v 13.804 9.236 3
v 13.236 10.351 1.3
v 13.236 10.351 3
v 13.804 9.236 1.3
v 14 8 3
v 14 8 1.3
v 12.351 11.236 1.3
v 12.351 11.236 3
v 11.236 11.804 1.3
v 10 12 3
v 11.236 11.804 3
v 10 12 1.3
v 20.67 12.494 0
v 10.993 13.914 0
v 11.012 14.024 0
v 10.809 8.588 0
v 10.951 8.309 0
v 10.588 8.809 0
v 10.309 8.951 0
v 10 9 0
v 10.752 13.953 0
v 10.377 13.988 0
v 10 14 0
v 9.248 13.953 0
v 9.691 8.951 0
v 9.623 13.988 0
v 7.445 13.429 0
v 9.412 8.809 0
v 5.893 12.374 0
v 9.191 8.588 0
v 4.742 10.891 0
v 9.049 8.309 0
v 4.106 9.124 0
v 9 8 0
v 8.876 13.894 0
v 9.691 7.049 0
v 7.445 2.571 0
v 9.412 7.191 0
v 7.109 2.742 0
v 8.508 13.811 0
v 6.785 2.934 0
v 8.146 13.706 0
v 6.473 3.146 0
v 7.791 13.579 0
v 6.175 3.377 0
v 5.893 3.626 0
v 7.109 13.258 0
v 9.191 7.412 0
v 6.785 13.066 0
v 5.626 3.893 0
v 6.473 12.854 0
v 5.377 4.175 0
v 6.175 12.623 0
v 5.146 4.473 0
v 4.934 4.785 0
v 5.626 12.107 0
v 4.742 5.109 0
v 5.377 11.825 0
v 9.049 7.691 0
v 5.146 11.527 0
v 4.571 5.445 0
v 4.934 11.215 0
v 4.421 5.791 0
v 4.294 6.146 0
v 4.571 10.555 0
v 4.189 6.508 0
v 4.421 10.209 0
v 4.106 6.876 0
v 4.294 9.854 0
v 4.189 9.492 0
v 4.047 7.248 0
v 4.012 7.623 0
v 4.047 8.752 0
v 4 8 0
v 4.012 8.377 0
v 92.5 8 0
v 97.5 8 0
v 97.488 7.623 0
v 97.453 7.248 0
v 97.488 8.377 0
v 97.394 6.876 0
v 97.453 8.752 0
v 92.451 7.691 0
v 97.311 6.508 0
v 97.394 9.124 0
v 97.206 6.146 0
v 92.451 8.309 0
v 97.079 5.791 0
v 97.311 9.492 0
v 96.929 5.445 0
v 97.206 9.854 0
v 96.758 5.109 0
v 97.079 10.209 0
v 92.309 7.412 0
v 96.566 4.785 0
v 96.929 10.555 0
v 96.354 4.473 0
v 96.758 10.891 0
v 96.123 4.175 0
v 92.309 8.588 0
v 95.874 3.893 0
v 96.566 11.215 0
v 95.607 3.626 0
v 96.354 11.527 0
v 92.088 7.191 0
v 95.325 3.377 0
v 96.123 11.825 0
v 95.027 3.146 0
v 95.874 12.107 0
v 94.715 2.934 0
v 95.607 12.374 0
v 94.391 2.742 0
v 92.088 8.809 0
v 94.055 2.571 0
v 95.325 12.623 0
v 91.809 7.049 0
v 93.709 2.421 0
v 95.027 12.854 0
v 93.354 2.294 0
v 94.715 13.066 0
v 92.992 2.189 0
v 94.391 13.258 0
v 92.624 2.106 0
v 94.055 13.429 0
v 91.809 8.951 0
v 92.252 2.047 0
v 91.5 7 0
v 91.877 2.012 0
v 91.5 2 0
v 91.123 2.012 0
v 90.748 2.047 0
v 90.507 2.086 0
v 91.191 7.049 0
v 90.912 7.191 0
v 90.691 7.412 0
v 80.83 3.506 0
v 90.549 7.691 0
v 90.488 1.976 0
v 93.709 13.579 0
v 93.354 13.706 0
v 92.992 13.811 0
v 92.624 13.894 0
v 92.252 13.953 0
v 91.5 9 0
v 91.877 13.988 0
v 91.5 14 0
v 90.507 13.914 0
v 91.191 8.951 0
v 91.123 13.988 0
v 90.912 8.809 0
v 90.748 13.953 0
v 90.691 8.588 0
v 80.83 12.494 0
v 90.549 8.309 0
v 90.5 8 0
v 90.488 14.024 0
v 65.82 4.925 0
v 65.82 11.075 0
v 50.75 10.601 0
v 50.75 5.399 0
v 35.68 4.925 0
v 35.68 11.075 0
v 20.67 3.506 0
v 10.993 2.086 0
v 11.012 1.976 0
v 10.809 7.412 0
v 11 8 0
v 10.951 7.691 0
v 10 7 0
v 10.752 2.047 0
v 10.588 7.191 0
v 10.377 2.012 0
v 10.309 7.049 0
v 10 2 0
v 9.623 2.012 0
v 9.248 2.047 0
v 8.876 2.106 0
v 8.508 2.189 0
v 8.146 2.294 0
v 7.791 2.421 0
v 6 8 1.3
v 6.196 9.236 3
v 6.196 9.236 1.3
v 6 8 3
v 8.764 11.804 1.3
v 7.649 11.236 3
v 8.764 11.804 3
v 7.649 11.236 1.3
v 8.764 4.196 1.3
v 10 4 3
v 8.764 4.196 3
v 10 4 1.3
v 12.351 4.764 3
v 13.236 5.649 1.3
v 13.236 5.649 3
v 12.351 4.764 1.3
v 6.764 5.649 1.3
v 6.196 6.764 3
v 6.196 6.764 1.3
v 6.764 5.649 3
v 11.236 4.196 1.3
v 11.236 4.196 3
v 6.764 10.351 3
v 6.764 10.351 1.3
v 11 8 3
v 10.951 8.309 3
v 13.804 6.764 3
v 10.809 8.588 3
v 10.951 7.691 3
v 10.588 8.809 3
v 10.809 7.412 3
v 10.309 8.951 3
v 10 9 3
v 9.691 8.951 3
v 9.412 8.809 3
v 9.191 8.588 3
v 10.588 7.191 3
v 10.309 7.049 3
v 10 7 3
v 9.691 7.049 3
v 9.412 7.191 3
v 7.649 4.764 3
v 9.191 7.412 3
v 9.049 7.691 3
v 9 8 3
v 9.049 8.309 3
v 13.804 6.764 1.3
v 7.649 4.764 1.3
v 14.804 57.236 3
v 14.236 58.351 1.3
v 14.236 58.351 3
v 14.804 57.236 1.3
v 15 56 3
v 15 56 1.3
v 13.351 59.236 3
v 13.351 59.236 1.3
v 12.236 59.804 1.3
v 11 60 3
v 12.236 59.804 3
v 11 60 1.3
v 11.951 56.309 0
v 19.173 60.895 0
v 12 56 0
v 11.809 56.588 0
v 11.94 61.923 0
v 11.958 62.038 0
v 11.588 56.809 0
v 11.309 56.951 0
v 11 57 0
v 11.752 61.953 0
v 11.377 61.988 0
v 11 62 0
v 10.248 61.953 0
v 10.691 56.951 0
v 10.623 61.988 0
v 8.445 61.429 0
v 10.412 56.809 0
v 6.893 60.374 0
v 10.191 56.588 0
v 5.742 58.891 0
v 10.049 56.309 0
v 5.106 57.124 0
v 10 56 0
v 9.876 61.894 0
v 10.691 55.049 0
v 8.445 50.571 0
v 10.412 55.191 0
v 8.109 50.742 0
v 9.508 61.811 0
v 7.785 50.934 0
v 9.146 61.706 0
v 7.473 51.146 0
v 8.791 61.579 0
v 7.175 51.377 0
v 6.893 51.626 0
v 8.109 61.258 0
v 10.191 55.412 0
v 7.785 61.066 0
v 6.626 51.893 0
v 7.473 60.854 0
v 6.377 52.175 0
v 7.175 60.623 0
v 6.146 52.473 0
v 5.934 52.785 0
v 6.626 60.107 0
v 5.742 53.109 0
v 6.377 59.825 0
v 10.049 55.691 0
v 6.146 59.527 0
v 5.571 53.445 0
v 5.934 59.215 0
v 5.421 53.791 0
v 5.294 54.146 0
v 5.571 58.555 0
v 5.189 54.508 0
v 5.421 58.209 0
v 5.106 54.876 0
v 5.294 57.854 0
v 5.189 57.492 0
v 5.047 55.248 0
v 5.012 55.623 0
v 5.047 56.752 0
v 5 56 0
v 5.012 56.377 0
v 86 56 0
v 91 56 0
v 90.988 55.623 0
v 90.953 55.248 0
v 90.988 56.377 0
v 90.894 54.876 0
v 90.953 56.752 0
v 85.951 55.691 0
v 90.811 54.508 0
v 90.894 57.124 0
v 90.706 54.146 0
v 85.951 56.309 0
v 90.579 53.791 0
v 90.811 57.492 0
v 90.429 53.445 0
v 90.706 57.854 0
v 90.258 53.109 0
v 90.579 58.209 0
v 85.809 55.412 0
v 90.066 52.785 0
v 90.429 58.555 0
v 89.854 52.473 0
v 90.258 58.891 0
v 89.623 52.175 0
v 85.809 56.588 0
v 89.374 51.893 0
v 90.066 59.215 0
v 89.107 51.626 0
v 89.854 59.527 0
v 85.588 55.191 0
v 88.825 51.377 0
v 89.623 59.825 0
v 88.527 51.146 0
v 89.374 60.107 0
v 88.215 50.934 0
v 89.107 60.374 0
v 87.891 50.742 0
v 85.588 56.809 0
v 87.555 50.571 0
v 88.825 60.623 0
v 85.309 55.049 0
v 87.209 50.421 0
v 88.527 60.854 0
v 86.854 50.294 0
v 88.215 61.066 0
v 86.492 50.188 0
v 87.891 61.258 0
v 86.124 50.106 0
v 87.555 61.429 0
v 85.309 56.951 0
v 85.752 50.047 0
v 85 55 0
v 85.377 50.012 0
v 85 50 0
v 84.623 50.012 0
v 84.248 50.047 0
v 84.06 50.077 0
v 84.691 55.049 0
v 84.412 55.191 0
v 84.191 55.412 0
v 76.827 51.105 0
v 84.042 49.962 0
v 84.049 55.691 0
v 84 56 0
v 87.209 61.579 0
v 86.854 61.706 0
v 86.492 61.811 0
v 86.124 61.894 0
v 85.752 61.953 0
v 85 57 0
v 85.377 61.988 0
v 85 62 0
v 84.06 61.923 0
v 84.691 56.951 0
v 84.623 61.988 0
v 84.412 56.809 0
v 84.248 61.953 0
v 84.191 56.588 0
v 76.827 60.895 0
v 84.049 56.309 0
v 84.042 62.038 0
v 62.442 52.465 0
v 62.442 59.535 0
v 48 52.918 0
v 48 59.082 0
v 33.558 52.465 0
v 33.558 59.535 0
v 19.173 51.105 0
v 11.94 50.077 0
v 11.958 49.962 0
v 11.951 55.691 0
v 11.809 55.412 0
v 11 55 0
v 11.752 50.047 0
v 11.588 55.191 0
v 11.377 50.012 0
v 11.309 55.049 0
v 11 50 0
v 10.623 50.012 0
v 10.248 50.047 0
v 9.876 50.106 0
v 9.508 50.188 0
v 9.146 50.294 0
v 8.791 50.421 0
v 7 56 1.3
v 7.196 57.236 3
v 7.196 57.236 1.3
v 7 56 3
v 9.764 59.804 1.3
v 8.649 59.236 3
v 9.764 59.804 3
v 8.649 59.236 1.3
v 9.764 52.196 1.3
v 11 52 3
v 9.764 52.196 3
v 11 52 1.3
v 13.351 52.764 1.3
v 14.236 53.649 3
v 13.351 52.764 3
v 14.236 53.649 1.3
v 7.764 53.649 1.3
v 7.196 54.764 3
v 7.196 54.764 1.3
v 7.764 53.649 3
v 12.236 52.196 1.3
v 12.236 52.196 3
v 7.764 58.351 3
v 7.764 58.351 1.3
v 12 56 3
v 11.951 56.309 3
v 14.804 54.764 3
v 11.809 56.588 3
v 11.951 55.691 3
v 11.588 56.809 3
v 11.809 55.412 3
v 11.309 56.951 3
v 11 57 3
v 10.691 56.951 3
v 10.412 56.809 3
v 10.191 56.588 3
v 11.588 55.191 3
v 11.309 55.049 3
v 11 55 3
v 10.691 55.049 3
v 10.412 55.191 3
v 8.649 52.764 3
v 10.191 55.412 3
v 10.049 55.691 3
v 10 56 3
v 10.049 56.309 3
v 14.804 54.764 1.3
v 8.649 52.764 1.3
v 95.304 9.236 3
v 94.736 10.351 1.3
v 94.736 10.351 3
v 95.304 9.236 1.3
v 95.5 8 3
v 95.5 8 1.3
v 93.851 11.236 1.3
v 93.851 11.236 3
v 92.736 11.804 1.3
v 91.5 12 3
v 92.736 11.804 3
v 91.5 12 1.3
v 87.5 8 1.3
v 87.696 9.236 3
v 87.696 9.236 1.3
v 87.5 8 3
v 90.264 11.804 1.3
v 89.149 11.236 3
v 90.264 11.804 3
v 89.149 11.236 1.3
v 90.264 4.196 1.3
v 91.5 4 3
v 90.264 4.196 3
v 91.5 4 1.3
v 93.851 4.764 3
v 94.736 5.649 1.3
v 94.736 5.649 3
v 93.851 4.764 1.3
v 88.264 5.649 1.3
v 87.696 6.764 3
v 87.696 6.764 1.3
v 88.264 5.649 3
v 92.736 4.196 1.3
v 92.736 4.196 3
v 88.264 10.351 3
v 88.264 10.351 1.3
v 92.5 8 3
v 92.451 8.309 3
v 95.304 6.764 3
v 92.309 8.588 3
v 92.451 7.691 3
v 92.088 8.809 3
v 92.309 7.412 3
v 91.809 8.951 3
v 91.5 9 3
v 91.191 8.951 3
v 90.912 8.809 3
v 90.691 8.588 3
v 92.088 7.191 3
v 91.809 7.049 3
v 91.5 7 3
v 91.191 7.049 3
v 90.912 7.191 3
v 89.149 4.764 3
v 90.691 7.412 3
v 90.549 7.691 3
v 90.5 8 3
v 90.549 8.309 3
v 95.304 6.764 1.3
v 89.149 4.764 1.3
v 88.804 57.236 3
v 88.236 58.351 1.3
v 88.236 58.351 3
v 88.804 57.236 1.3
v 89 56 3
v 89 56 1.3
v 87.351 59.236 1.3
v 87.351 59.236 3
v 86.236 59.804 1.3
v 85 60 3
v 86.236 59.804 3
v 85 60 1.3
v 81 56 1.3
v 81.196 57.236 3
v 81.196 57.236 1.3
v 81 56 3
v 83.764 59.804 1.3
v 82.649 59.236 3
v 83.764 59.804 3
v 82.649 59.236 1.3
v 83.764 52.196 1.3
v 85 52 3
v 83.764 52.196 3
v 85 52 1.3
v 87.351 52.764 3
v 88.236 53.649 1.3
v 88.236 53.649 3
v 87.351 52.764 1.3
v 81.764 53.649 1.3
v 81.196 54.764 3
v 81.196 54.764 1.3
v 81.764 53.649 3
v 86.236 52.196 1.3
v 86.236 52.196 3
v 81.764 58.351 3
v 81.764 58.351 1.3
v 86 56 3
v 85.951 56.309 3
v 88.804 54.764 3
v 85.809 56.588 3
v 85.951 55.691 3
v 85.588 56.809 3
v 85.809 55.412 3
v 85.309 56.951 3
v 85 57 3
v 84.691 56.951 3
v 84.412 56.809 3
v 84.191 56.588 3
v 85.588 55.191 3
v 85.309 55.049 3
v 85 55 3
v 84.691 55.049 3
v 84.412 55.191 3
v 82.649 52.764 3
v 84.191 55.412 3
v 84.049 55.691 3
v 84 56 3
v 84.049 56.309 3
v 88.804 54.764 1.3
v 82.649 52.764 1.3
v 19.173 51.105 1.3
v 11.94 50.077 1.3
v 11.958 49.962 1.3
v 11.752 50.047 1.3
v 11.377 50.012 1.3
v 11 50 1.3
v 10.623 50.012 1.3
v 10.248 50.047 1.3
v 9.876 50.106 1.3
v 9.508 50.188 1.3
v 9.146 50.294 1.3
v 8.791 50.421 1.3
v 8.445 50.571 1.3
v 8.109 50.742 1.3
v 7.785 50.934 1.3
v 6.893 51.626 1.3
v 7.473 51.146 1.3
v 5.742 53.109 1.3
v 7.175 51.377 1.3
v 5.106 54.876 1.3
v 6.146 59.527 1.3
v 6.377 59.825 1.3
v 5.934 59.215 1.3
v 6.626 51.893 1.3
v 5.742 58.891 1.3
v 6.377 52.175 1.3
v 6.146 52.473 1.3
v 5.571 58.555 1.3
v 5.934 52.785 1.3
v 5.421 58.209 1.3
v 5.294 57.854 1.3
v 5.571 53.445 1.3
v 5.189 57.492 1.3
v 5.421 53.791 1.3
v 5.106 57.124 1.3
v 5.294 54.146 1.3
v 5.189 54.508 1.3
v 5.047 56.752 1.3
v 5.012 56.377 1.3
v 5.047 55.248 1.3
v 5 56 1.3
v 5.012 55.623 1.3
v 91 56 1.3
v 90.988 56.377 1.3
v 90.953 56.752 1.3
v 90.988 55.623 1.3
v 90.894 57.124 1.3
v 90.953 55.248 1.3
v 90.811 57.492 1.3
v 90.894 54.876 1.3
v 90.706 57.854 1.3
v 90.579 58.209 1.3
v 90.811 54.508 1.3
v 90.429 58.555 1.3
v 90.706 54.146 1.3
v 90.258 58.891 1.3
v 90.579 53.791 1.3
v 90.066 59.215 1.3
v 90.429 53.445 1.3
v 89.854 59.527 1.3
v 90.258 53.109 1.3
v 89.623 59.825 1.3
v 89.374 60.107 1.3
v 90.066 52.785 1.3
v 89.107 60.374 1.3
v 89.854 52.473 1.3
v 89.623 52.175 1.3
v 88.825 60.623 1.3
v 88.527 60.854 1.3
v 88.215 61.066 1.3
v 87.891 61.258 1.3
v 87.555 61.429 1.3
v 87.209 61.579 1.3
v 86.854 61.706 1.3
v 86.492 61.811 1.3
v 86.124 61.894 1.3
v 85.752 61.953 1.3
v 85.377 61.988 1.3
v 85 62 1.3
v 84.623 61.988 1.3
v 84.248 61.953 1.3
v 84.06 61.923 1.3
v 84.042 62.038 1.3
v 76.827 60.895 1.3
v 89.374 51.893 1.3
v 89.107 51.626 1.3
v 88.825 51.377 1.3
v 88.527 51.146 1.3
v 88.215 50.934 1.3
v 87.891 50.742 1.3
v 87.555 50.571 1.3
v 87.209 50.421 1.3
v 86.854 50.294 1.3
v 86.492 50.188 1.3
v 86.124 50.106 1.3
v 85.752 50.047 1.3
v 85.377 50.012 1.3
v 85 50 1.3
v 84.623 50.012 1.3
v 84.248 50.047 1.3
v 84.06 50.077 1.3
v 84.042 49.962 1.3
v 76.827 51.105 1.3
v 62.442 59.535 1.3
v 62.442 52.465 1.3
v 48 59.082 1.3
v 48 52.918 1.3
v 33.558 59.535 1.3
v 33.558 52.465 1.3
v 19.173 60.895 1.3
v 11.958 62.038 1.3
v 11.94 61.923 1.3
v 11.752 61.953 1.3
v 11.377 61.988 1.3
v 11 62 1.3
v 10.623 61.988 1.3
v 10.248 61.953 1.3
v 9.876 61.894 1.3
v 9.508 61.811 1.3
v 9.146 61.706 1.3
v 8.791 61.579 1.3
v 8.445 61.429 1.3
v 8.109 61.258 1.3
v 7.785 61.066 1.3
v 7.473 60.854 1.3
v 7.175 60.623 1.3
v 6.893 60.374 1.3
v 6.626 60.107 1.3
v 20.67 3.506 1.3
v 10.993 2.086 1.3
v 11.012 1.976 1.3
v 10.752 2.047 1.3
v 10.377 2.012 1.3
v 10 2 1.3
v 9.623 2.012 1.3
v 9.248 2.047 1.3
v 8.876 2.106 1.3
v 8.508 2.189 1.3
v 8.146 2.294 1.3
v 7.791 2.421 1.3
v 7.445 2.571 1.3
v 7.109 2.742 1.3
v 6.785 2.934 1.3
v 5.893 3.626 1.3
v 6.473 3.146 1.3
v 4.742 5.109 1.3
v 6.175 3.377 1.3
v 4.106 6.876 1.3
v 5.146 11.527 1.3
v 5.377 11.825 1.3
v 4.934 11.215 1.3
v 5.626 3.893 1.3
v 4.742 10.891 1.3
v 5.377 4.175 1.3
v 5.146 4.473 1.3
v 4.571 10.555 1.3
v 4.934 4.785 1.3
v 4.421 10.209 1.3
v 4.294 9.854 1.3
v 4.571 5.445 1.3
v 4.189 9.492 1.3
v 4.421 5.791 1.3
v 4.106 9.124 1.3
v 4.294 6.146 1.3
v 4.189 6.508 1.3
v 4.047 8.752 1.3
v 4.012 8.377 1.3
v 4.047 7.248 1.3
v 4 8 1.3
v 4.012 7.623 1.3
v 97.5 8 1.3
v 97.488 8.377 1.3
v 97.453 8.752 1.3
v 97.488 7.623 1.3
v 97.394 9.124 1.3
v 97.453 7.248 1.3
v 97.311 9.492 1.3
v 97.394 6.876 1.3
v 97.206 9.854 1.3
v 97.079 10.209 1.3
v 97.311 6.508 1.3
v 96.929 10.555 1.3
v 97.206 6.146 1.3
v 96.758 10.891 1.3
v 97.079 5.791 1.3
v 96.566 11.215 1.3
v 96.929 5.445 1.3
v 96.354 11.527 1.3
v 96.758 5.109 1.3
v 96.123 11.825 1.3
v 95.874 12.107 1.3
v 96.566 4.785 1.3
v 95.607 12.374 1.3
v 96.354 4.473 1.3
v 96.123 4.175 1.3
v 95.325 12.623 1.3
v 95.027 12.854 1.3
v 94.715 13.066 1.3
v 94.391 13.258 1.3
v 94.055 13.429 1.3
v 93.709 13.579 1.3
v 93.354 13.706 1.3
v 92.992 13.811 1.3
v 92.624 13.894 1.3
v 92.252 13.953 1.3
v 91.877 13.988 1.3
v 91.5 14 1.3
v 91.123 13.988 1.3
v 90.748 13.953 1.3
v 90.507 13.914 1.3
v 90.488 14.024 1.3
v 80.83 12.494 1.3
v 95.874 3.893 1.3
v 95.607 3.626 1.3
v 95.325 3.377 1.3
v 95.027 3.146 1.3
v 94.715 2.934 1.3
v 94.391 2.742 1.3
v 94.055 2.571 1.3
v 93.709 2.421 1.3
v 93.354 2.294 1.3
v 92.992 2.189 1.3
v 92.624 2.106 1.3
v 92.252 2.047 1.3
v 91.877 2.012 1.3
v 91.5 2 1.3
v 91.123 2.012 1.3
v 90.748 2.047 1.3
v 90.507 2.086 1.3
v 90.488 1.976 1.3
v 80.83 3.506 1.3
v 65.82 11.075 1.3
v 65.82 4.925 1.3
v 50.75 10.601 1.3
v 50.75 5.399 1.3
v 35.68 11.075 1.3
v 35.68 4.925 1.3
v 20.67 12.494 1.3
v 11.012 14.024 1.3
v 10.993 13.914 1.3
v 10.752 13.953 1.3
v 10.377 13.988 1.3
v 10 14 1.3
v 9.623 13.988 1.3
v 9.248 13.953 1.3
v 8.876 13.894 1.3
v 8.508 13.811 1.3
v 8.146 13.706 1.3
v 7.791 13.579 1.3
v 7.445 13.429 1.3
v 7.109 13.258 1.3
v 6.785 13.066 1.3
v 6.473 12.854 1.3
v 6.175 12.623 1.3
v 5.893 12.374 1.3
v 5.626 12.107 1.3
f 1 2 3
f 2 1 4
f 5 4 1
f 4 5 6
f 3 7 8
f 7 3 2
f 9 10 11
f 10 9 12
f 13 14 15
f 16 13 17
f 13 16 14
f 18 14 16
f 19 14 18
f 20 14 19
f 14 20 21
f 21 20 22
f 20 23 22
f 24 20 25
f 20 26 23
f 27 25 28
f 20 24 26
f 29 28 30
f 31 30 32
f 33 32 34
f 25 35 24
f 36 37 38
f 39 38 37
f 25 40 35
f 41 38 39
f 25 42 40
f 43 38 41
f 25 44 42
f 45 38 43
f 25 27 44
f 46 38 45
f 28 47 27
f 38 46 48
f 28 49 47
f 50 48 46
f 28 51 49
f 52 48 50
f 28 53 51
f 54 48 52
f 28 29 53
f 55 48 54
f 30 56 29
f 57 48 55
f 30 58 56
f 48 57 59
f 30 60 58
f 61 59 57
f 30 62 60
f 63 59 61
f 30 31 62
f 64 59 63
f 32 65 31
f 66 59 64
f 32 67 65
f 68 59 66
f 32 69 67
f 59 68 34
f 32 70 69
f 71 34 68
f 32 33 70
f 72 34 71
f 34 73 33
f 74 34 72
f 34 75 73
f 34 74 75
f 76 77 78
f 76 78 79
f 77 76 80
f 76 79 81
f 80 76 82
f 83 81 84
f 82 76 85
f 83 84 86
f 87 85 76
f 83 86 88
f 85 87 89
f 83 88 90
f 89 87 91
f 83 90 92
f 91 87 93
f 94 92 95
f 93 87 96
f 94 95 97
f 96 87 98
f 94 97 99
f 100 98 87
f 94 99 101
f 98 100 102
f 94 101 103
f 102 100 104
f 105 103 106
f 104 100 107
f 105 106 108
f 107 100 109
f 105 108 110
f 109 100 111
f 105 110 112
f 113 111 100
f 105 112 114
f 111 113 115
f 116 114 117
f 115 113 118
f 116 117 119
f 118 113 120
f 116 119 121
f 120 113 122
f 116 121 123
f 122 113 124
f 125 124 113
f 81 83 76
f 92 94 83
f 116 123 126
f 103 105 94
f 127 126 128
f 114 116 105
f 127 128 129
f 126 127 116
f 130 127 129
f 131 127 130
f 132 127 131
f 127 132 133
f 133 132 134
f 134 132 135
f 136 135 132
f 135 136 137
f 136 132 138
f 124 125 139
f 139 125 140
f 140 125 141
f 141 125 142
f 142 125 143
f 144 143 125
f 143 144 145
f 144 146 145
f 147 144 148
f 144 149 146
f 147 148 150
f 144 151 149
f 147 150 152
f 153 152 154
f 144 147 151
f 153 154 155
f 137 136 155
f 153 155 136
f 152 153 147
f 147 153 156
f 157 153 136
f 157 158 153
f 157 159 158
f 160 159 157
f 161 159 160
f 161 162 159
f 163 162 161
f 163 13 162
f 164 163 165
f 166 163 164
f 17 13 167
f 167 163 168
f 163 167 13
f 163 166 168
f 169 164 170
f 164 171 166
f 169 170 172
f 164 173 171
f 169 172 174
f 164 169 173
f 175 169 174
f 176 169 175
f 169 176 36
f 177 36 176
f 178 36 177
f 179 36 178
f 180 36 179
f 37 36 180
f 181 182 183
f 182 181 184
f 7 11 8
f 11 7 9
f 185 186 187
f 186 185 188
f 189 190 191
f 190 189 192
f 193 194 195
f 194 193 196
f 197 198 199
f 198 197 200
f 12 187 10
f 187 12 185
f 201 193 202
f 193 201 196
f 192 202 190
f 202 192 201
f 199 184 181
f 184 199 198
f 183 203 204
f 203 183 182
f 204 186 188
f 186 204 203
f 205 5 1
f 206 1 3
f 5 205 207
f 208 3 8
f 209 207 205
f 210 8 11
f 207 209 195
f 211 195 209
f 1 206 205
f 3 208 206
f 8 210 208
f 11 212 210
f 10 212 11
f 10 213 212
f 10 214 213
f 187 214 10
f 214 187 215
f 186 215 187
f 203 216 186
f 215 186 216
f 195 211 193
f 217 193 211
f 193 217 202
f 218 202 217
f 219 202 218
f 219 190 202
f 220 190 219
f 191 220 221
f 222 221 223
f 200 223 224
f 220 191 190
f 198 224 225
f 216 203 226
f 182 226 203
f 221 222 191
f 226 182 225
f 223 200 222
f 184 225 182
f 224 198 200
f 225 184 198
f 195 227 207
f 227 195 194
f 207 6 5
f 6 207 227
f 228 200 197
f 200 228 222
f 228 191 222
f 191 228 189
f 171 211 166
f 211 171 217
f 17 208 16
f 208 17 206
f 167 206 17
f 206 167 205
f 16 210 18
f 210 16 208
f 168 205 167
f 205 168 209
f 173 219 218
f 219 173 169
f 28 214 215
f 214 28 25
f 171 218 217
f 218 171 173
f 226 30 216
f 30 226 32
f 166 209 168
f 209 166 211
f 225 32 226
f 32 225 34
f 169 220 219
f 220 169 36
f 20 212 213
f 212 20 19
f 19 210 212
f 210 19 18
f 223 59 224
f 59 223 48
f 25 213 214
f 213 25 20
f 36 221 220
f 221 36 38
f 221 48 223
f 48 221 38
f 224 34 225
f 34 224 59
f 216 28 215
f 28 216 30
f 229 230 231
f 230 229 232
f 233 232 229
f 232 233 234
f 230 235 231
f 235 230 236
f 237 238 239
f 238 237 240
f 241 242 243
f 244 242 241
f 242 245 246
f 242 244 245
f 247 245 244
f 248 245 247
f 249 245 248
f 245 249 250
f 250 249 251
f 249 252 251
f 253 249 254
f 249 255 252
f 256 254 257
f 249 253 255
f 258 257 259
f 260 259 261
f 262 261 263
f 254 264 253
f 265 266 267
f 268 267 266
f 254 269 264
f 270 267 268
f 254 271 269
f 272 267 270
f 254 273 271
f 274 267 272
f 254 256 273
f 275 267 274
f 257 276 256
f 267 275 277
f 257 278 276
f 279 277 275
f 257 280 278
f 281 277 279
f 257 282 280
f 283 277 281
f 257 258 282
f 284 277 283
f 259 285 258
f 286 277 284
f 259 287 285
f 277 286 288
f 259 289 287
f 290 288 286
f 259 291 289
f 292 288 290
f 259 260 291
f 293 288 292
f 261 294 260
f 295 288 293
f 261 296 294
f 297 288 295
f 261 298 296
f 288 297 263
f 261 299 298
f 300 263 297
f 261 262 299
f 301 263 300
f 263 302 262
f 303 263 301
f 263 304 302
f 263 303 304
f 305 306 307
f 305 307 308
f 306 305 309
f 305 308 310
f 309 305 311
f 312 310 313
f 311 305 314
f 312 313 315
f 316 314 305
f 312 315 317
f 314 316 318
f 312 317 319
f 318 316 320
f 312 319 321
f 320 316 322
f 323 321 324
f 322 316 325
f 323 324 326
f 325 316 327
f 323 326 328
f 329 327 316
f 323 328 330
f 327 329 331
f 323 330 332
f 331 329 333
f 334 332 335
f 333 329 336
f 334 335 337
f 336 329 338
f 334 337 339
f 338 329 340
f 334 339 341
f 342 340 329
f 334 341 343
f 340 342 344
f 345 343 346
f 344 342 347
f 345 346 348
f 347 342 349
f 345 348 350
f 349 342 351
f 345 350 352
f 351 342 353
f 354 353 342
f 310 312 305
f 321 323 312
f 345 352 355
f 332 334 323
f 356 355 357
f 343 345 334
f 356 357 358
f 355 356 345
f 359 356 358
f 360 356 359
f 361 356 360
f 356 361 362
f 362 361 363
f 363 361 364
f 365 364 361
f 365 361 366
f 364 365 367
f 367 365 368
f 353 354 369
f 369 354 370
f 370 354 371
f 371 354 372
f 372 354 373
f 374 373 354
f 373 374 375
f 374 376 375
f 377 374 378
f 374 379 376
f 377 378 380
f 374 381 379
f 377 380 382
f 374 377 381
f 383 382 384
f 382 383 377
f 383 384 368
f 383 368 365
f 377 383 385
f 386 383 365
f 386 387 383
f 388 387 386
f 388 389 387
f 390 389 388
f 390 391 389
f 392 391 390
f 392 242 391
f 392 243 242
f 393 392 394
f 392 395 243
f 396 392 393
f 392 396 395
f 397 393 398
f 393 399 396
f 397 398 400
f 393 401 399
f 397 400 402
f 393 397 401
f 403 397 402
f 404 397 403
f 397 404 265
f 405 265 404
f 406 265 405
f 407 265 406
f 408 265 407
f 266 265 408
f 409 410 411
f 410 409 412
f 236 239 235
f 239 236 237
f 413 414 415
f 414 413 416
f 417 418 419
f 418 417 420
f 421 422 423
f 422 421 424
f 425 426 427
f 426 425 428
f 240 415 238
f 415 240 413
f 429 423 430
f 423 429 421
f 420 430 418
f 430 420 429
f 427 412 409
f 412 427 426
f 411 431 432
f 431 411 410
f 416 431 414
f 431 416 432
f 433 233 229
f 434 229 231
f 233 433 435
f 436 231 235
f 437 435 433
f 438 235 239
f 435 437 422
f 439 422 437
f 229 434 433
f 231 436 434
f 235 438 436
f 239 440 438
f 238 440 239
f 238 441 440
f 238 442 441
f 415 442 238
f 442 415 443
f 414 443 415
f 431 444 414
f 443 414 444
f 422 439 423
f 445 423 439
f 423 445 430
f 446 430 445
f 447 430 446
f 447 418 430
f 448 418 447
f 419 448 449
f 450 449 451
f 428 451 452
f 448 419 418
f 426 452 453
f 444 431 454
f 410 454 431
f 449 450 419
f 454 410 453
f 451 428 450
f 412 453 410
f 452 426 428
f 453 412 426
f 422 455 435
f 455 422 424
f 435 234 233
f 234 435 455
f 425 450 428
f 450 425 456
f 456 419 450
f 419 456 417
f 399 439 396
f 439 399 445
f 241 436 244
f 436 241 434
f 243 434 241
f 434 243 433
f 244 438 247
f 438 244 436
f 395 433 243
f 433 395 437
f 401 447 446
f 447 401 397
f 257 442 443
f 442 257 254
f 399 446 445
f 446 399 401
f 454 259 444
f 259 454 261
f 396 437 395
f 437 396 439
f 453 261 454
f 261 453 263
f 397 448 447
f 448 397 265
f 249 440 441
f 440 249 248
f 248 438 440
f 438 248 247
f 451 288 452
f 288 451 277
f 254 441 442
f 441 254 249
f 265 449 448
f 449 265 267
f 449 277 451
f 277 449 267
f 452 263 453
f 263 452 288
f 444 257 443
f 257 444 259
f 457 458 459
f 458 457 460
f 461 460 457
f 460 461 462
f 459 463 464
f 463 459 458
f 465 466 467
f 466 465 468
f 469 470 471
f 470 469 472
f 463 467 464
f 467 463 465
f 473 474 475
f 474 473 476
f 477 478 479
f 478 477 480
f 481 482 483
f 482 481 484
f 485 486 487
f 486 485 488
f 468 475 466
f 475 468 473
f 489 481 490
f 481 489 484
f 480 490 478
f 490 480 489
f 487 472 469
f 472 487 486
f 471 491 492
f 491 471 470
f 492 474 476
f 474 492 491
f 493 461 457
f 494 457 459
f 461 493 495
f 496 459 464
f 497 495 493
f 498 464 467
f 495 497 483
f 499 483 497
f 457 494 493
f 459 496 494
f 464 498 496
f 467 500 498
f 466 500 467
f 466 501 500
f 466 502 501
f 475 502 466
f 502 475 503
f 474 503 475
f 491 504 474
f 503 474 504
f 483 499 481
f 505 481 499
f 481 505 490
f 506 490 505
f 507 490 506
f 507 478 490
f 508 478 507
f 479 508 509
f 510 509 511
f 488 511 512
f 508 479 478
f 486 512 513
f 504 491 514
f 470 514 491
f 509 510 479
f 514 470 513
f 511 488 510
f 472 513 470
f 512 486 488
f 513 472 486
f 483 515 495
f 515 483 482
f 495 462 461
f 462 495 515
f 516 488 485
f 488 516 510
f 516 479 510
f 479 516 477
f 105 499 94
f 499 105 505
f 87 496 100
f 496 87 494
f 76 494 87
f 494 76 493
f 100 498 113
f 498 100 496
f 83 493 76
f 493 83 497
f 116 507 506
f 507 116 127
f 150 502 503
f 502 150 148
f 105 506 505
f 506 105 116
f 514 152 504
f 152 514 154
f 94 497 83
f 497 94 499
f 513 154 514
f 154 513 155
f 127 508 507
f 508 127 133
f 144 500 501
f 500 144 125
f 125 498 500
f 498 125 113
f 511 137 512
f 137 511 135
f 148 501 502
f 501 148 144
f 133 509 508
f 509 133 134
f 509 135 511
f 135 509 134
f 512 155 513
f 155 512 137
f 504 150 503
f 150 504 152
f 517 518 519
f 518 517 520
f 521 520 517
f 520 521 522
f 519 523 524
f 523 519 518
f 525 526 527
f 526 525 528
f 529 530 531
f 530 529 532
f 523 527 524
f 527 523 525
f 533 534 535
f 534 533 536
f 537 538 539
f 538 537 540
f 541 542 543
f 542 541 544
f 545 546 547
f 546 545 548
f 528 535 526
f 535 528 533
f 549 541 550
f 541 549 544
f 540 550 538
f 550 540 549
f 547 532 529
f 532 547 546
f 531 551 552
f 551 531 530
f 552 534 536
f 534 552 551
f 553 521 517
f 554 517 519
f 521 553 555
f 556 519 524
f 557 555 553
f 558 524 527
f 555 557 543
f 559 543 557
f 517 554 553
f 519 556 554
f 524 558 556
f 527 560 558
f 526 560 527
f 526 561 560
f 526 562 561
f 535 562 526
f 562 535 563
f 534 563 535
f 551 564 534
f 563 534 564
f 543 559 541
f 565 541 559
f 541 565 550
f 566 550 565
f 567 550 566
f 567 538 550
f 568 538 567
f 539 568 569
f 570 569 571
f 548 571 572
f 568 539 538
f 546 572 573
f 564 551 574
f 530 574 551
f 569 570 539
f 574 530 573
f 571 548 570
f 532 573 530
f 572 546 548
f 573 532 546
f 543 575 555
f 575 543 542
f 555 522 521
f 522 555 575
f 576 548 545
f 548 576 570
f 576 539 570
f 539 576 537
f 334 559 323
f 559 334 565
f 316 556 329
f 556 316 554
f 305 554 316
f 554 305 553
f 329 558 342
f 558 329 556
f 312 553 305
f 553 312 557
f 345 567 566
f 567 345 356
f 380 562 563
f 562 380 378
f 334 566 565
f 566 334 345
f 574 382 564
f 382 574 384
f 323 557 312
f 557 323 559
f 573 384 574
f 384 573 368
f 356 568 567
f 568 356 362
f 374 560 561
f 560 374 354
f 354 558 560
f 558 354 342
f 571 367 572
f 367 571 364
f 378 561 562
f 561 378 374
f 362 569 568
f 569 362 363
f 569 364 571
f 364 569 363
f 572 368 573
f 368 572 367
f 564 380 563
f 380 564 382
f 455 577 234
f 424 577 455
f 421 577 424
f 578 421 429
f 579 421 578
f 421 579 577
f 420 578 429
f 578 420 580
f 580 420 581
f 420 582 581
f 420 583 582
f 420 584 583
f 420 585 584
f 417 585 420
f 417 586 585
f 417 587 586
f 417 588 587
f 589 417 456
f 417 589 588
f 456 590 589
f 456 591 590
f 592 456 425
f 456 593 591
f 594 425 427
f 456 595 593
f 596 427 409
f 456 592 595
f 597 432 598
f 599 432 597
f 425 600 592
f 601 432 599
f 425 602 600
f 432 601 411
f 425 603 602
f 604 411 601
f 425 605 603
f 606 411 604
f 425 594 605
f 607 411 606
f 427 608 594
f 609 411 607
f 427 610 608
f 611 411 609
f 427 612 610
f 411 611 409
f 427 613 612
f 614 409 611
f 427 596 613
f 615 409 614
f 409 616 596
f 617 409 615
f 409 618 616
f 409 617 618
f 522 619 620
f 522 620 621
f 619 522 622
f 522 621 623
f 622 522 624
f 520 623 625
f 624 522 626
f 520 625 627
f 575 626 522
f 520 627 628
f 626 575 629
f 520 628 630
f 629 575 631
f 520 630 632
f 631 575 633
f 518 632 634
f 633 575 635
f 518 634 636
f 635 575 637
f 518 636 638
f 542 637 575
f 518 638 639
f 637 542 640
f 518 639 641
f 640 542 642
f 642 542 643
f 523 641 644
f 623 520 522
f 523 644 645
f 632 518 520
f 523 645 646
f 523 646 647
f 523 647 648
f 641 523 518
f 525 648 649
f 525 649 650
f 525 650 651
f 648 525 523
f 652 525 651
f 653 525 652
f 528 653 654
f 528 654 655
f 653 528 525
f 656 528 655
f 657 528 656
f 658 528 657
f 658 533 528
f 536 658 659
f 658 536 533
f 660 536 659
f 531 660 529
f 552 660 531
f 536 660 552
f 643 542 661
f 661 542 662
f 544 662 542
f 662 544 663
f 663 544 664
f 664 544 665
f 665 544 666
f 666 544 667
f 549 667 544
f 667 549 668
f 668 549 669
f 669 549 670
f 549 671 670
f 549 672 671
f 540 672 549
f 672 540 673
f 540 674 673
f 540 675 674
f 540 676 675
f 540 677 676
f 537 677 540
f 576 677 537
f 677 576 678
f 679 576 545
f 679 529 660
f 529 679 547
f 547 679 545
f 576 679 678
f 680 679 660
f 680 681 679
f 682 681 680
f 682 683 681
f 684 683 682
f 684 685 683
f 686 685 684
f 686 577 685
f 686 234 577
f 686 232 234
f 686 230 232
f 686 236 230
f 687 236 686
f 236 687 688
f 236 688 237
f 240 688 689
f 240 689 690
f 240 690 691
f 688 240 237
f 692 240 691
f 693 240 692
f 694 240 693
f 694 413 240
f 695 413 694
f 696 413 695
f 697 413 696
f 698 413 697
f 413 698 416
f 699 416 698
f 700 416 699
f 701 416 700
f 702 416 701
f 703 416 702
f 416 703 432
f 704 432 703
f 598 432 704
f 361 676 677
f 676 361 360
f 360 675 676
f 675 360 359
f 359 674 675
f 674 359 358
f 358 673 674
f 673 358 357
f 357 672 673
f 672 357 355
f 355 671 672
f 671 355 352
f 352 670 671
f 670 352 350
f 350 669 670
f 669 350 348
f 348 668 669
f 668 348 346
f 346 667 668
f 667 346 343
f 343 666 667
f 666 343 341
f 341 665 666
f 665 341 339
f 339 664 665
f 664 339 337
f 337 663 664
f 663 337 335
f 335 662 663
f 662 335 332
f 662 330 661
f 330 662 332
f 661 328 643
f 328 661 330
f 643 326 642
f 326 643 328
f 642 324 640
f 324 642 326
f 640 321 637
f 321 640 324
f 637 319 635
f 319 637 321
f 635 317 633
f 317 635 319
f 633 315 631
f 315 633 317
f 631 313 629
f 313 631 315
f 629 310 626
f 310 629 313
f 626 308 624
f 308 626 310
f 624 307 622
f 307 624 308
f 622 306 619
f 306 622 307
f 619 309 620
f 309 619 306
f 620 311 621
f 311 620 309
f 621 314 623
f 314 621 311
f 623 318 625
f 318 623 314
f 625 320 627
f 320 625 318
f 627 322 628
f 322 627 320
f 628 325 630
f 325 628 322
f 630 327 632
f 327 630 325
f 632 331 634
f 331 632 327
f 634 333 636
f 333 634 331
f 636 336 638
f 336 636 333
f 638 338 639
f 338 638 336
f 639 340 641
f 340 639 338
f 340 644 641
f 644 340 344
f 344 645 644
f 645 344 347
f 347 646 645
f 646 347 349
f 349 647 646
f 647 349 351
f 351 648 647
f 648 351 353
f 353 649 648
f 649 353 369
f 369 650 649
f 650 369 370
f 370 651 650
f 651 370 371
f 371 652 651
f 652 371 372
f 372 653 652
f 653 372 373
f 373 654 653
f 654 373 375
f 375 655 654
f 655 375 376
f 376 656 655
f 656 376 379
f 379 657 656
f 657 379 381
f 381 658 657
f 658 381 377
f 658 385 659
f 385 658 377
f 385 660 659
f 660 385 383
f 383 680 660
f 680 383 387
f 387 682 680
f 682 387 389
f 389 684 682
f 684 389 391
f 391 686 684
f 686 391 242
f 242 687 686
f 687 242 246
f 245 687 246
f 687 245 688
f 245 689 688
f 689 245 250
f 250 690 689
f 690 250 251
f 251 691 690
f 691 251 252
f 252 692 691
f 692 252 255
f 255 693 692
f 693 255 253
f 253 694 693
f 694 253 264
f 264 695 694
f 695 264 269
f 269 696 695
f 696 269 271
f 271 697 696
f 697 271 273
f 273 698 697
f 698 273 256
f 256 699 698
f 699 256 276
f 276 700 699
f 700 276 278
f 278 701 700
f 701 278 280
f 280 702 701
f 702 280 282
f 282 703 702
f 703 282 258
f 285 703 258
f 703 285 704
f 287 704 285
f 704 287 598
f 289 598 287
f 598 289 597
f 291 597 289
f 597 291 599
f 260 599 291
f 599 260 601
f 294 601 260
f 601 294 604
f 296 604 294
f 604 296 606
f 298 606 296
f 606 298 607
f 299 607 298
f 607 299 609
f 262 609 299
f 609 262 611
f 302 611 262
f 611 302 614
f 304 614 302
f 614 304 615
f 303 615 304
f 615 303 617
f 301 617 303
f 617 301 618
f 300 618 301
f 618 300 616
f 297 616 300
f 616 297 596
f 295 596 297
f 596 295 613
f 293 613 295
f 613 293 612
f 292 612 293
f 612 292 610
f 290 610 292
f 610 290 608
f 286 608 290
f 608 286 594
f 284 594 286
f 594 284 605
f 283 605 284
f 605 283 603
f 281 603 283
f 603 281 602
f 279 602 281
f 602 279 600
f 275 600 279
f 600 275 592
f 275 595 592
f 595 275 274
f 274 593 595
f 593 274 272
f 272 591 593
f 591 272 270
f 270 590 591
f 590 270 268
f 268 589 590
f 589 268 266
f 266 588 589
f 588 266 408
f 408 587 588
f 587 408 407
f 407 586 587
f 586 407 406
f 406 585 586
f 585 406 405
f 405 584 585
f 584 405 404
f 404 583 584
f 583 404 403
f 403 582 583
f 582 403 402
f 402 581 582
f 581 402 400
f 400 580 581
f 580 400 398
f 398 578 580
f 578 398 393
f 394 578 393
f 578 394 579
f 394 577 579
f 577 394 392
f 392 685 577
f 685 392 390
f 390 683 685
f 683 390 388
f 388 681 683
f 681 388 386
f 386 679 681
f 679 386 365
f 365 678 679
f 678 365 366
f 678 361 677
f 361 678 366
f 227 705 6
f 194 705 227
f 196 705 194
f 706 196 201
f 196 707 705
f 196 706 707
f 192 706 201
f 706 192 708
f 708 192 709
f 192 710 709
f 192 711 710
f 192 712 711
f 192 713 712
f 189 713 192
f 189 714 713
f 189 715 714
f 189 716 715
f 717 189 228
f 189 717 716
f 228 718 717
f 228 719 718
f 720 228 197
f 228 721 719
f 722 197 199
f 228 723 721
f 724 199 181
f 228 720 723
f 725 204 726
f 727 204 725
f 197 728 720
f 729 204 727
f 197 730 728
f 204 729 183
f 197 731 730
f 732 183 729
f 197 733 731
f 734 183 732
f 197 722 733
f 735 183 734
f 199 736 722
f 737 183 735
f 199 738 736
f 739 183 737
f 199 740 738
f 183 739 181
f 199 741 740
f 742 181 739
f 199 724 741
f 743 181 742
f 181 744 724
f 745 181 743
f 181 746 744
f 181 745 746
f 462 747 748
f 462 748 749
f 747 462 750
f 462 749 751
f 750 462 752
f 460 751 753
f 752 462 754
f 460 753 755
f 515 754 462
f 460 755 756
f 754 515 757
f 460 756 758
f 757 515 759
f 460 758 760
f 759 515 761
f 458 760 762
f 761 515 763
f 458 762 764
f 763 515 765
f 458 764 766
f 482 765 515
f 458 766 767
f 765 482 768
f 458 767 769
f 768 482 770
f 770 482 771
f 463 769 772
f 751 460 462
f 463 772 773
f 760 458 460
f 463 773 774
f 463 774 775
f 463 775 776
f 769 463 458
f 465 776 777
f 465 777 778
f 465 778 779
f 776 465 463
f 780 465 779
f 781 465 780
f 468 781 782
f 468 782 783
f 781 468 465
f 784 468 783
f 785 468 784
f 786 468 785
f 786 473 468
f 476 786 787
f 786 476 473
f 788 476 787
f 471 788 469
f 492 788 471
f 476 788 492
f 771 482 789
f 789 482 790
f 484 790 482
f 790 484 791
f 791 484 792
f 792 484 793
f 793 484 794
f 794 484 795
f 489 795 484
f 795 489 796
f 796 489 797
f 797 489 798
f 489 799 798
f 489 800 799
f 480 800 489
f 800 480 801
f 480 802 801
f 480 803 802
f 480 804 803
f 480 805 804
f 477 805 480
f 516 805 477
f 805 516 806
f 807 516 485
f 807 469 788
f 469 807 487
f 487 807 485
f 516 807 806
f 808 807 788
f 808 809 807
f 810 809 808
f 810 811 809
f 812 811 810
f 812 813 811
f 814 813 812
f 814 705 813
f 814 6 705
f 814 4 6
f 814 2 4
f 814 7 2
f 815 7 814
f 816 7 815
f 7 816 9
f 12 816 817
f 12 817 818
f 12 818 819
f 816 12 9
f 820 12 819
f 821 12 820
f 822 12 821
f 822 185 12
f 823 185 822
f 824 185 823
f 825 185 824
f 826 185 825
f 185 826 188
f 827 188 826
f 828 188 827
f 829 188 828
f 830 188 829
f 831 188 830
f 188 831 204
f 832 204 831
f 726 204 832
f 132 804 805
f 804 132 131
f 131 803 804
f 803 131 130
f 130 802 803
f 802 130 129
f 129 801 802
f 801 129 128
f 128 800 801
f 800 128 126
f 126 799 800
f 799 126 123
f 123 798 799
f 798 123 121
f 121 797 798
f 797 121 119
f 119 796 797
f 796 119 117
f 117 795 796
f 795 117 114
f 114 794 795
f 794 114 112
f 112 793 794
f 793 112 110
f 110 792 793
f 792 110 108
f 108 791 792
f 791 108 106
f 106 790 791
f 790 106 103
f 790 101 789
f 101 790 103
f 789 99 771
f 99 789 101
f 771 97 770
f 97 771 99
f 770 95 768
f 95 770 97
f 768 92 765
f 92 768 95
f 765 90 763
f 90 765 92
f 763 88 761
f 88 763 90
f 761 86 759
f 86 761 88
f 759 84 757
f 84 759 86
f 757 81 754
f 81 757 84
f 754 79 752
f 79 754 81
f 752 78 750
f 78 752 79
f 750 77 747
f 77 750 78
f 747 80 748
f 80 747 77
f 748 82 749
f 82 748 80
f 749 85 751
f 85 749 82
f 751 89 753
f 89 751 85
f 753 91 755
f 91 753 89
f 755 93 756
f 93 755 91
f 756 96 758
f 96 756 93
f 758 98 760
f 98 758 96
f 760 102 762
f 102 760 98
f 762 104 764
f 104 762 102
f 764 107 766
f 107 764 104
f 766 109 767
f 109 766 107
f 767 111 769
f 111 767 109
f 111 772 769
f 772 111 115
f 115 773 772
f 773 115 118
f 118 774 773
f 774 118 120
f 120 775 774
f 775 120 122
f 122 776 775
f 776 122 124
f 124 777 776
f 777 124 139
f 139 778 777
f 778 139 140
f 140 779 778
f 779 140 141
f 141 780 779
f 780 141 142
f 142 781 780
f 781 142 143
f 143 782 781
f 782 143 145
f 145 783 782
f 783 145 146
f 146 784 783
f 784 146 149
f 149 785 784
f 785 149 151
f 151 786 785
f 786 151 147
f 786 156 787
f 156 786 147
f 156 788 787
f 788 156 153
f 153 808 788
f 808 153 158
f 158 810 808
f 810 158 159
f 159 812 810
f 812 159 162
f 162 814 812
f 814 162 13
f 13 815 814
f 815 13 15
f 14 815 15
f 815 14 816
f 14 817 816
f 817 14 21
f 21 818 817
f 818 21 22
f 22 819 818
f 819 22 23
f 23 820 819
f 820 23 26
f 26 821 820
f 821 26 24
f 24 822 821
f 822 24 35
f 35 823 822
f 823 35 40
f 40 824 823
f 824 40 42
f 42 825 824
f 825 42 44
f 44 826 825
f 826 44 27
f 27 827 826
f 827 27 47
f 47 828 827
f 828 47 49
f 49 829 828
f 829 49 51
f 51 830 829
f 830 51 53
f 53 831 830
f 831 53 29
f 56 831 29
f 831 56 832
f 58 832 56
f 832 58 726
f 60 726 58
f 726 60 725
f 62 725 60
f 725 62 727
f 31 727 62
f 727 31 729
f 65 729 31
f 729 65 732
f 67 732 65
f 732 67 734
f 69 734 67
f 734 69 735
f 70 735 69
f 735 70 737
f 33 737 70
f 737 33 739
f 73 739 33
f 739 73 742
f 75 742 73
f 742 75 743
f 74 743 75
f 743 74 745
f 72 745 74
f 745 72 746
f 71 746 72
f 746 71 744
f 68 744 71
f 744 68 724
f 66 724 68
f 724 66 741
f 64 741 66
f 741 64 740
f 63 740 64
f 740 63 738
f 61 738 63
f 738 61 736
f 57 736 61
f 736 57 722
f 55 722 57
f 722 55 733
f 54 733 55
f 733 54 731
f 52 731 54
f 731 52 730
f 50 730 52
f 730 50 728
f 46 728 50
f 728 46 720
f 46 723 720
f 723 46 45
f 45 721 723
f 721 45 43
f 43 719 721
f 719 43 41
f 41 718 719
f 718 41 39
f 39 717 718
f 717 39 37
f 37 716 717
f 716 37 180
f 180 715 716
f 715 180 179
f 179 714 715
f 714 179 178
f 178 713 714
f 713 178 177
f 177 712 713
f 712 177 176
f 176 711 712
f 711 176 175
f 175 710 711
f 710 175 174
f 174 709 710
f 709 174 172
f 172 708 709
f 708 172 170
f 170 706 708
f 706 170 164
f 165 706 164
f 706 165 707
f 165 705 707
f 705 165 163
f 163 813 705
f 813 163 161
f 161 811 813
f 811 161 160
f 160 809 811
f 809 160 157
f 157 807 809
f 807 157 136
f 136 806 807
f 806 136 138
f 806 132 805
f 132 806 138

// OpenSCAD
// By Josiah Ritchie <josiah@josiahritchie.com>
// For mounting a Panucatt X3 controller in holes for an Arduino Mega/RAMPS

///////////////
// Settings 
///////////////

// How thick should the walls of the radius be in mm?
standoff_wall_thickness = 3;  

// How big a hole should be in the middle of the Arduino Mega standoff?
standoff_inner_radius_am = 1; 

// How tall should the Arduino Mega standoffs be?
height_am = 3; 

// How big a hole should be in the middle of the standoff? (X3 hole is about 3.8)
standoff_inner_radius_x3 = 2.5; 

// How tall should the X3 standoffs be?
height_x3 = 15; 

// cable tie mount height
height = 7;

// cable tie mount width
width = 10;

// cable tie mount depth
depth = 3;

// cable tie mount wall width
wall_width = 3;

////////////////////
// Make the thing!
////////////////////

!color("blue")
  translate([10,8,0])arduino_mega_standoffs(height_am,standoff_wall_thickness,standoff_inner_radius_am);


//////////////////////////////
// Functions & Modules
//////////////////////////////

// Make a cable-tie mount
module ctmount(height,width,depth,wall_width) {

  outer_radius = width/2;
  inner_radius = width/2-wall_width;

  difference() {
  // Circle at top
  rotate(a=[0,90,90]) {
    difference() {
      cylinder(h=depth,r1=outer_radius,r2=outer_radius,$fn=20);
      cylinder(h=depth,r1=inner_radius,r2=inner_radius,$fn=20);
      translate([0,-2,0]) cube(size = [height,inner_radius*2,depth], center = false, $fn=20);
    }
  }
}
  // Sides
  rotate(a=[90,0,0])translate([-width/2,-height,-depth]) {
    cube(size = [wall_width,height,depth], center = false, $fn=20);
    translate([wall_width+(inner_radius*2),0,0]) {
      cube(size = [wall_width,height,depth], center = false, $fn=20);
    }
  }
}

// Make a basic standoff
module standoff(height,thickness,inner_radius) {
  
  // Inner radius + wall thickness = outer radius of the standoff
  outer_radius = inner_radius + thickness;

  // Make the standoff cylinder and remove the hole in the center
  difference() {
    cylinder(h=height,r1=outer_radius,r2=outer_radius,$fn=20);
    cylinder(h=height,r1=inner_radius,r2=inner_radius,$fn=20);
  }
}

// Make 4 standoffs and space them appropriately for an Arduino Mega
module arduino_mega_standoffs(up,out,in) {
  // Arduino Mega mounting holes are at [0,0],[81.5,0],[1,48],[75,48]
  bl = [0,0,0]; //bottomleft
  br = [81.5,0,0]; //bottomright
  tl = [1,48,0]; //topleft
  tr = [75,48,0]; //topright

  standoff(up,out,in);
  translate(tl)standoff(up,out,in);
  translate(br)standoff(up,out,in);
  translate(tr)standoff(up,out,in);

  // Support structure to connect posts for Arduino
  barbell_w_hole(tr,tl,6,6,230,230);
  barbell_w_hole(br,bl,6,6,240,240);
}

// make 4 standoffs and space them appropriately for a Panucatt X3
module x3_standoffs(up,out,in){
  bl = [0,0,0]; //bottomleft
  br = [101.6,0,0]; //bottomright
  tl = [0,64.3,0]; //topleft
  tr = [101.6,64.3,0]; //topright

  // X3 holes are in a square 4"x2.53" (101.6mm x 64.3mm) on center
  standoff(up,out,in);
  translate(br) standoff(up,out,in);
  translate(tr) standoff(up,out,in);
  translate(tl) standoff(up,out,in);

  // Support structure to connect posts
  $fn=100;
  linear_extrude (height=1.3)barbell([bl[0],bl[1]],[br[0],br[1]],6,6,2000,230);
  linear_extrude (height=1.3)barbell([tl[0],tl[1]],[tr[0],tr[1]],6,6,240,1500);
  linear_extrude (height=1.3)barbell([br[0],br[1]],[tr[0],tr[1]],6,6,150,150);
  linear_extrude (height=1.3)barbell([tl[0],tl[1]],[bl[0],bl[1]],6,6,150,150);
}

module barbell_w_hole (pA,pB,r1,r2,r3,r4)
{
  //pA is position of the first point in three coordinates
  //pB is position of the second point in three coordinates
  $fn=100;


  difference ()
  {
    linear_extrude(height=1.3)barbell([pA[0],pA[1]],[pB[0],pB[1]],r1,r2,r3,r4);
    translate(pA)cylinder(h=height_am,r=standoff_inner_radius_am);
    translate(pB)cylinder(h=height_am,r=standoff_inner_radius_am);
  }
}

// Below is directly from Thing #14742: http://www.thingiverse.com/thing:14742
// x1 and x2 are x,y coordinates.

module barbell (x1,x2,r1,r2,r3,r4) 
{
	x3=triangulate (x1,x2,r1+r3,r2+r3);
	x4=triangulate (x2,x1,r2+r4,r1+r4);
	render()
	difference ()
	{
		union()
		{
			translate(x1)
			circle (r=r1);
			translate(x2)
			circle(r=r2);
			polygon (points=[x1,x3,x2,x4]);
		}
		translate(x3)
		circle(r=r3,$fa=5);
		translate(x4)
		circle(r=r4,$fa=5);
	}
}

function triangulate (point1, point2, length1, length2) = 
point1 + 
length1*rotated(
atan2(point2[1]-point1[1],point2[0]-point1[0])+
angle(distance(point1,point2),length1,length2));

function distance(point1,point2)=
sqrt((point1[0]-point2[0])*(point1[0]-point2[0])+
(point1[1]-point2[1])*(point1[1]-point2[1]));

function angle(a,b,c) = acos((a*a+b*b-c*c)/(2*a*b)); 

function rotated(a)=[cos(a),sin(a),0];
